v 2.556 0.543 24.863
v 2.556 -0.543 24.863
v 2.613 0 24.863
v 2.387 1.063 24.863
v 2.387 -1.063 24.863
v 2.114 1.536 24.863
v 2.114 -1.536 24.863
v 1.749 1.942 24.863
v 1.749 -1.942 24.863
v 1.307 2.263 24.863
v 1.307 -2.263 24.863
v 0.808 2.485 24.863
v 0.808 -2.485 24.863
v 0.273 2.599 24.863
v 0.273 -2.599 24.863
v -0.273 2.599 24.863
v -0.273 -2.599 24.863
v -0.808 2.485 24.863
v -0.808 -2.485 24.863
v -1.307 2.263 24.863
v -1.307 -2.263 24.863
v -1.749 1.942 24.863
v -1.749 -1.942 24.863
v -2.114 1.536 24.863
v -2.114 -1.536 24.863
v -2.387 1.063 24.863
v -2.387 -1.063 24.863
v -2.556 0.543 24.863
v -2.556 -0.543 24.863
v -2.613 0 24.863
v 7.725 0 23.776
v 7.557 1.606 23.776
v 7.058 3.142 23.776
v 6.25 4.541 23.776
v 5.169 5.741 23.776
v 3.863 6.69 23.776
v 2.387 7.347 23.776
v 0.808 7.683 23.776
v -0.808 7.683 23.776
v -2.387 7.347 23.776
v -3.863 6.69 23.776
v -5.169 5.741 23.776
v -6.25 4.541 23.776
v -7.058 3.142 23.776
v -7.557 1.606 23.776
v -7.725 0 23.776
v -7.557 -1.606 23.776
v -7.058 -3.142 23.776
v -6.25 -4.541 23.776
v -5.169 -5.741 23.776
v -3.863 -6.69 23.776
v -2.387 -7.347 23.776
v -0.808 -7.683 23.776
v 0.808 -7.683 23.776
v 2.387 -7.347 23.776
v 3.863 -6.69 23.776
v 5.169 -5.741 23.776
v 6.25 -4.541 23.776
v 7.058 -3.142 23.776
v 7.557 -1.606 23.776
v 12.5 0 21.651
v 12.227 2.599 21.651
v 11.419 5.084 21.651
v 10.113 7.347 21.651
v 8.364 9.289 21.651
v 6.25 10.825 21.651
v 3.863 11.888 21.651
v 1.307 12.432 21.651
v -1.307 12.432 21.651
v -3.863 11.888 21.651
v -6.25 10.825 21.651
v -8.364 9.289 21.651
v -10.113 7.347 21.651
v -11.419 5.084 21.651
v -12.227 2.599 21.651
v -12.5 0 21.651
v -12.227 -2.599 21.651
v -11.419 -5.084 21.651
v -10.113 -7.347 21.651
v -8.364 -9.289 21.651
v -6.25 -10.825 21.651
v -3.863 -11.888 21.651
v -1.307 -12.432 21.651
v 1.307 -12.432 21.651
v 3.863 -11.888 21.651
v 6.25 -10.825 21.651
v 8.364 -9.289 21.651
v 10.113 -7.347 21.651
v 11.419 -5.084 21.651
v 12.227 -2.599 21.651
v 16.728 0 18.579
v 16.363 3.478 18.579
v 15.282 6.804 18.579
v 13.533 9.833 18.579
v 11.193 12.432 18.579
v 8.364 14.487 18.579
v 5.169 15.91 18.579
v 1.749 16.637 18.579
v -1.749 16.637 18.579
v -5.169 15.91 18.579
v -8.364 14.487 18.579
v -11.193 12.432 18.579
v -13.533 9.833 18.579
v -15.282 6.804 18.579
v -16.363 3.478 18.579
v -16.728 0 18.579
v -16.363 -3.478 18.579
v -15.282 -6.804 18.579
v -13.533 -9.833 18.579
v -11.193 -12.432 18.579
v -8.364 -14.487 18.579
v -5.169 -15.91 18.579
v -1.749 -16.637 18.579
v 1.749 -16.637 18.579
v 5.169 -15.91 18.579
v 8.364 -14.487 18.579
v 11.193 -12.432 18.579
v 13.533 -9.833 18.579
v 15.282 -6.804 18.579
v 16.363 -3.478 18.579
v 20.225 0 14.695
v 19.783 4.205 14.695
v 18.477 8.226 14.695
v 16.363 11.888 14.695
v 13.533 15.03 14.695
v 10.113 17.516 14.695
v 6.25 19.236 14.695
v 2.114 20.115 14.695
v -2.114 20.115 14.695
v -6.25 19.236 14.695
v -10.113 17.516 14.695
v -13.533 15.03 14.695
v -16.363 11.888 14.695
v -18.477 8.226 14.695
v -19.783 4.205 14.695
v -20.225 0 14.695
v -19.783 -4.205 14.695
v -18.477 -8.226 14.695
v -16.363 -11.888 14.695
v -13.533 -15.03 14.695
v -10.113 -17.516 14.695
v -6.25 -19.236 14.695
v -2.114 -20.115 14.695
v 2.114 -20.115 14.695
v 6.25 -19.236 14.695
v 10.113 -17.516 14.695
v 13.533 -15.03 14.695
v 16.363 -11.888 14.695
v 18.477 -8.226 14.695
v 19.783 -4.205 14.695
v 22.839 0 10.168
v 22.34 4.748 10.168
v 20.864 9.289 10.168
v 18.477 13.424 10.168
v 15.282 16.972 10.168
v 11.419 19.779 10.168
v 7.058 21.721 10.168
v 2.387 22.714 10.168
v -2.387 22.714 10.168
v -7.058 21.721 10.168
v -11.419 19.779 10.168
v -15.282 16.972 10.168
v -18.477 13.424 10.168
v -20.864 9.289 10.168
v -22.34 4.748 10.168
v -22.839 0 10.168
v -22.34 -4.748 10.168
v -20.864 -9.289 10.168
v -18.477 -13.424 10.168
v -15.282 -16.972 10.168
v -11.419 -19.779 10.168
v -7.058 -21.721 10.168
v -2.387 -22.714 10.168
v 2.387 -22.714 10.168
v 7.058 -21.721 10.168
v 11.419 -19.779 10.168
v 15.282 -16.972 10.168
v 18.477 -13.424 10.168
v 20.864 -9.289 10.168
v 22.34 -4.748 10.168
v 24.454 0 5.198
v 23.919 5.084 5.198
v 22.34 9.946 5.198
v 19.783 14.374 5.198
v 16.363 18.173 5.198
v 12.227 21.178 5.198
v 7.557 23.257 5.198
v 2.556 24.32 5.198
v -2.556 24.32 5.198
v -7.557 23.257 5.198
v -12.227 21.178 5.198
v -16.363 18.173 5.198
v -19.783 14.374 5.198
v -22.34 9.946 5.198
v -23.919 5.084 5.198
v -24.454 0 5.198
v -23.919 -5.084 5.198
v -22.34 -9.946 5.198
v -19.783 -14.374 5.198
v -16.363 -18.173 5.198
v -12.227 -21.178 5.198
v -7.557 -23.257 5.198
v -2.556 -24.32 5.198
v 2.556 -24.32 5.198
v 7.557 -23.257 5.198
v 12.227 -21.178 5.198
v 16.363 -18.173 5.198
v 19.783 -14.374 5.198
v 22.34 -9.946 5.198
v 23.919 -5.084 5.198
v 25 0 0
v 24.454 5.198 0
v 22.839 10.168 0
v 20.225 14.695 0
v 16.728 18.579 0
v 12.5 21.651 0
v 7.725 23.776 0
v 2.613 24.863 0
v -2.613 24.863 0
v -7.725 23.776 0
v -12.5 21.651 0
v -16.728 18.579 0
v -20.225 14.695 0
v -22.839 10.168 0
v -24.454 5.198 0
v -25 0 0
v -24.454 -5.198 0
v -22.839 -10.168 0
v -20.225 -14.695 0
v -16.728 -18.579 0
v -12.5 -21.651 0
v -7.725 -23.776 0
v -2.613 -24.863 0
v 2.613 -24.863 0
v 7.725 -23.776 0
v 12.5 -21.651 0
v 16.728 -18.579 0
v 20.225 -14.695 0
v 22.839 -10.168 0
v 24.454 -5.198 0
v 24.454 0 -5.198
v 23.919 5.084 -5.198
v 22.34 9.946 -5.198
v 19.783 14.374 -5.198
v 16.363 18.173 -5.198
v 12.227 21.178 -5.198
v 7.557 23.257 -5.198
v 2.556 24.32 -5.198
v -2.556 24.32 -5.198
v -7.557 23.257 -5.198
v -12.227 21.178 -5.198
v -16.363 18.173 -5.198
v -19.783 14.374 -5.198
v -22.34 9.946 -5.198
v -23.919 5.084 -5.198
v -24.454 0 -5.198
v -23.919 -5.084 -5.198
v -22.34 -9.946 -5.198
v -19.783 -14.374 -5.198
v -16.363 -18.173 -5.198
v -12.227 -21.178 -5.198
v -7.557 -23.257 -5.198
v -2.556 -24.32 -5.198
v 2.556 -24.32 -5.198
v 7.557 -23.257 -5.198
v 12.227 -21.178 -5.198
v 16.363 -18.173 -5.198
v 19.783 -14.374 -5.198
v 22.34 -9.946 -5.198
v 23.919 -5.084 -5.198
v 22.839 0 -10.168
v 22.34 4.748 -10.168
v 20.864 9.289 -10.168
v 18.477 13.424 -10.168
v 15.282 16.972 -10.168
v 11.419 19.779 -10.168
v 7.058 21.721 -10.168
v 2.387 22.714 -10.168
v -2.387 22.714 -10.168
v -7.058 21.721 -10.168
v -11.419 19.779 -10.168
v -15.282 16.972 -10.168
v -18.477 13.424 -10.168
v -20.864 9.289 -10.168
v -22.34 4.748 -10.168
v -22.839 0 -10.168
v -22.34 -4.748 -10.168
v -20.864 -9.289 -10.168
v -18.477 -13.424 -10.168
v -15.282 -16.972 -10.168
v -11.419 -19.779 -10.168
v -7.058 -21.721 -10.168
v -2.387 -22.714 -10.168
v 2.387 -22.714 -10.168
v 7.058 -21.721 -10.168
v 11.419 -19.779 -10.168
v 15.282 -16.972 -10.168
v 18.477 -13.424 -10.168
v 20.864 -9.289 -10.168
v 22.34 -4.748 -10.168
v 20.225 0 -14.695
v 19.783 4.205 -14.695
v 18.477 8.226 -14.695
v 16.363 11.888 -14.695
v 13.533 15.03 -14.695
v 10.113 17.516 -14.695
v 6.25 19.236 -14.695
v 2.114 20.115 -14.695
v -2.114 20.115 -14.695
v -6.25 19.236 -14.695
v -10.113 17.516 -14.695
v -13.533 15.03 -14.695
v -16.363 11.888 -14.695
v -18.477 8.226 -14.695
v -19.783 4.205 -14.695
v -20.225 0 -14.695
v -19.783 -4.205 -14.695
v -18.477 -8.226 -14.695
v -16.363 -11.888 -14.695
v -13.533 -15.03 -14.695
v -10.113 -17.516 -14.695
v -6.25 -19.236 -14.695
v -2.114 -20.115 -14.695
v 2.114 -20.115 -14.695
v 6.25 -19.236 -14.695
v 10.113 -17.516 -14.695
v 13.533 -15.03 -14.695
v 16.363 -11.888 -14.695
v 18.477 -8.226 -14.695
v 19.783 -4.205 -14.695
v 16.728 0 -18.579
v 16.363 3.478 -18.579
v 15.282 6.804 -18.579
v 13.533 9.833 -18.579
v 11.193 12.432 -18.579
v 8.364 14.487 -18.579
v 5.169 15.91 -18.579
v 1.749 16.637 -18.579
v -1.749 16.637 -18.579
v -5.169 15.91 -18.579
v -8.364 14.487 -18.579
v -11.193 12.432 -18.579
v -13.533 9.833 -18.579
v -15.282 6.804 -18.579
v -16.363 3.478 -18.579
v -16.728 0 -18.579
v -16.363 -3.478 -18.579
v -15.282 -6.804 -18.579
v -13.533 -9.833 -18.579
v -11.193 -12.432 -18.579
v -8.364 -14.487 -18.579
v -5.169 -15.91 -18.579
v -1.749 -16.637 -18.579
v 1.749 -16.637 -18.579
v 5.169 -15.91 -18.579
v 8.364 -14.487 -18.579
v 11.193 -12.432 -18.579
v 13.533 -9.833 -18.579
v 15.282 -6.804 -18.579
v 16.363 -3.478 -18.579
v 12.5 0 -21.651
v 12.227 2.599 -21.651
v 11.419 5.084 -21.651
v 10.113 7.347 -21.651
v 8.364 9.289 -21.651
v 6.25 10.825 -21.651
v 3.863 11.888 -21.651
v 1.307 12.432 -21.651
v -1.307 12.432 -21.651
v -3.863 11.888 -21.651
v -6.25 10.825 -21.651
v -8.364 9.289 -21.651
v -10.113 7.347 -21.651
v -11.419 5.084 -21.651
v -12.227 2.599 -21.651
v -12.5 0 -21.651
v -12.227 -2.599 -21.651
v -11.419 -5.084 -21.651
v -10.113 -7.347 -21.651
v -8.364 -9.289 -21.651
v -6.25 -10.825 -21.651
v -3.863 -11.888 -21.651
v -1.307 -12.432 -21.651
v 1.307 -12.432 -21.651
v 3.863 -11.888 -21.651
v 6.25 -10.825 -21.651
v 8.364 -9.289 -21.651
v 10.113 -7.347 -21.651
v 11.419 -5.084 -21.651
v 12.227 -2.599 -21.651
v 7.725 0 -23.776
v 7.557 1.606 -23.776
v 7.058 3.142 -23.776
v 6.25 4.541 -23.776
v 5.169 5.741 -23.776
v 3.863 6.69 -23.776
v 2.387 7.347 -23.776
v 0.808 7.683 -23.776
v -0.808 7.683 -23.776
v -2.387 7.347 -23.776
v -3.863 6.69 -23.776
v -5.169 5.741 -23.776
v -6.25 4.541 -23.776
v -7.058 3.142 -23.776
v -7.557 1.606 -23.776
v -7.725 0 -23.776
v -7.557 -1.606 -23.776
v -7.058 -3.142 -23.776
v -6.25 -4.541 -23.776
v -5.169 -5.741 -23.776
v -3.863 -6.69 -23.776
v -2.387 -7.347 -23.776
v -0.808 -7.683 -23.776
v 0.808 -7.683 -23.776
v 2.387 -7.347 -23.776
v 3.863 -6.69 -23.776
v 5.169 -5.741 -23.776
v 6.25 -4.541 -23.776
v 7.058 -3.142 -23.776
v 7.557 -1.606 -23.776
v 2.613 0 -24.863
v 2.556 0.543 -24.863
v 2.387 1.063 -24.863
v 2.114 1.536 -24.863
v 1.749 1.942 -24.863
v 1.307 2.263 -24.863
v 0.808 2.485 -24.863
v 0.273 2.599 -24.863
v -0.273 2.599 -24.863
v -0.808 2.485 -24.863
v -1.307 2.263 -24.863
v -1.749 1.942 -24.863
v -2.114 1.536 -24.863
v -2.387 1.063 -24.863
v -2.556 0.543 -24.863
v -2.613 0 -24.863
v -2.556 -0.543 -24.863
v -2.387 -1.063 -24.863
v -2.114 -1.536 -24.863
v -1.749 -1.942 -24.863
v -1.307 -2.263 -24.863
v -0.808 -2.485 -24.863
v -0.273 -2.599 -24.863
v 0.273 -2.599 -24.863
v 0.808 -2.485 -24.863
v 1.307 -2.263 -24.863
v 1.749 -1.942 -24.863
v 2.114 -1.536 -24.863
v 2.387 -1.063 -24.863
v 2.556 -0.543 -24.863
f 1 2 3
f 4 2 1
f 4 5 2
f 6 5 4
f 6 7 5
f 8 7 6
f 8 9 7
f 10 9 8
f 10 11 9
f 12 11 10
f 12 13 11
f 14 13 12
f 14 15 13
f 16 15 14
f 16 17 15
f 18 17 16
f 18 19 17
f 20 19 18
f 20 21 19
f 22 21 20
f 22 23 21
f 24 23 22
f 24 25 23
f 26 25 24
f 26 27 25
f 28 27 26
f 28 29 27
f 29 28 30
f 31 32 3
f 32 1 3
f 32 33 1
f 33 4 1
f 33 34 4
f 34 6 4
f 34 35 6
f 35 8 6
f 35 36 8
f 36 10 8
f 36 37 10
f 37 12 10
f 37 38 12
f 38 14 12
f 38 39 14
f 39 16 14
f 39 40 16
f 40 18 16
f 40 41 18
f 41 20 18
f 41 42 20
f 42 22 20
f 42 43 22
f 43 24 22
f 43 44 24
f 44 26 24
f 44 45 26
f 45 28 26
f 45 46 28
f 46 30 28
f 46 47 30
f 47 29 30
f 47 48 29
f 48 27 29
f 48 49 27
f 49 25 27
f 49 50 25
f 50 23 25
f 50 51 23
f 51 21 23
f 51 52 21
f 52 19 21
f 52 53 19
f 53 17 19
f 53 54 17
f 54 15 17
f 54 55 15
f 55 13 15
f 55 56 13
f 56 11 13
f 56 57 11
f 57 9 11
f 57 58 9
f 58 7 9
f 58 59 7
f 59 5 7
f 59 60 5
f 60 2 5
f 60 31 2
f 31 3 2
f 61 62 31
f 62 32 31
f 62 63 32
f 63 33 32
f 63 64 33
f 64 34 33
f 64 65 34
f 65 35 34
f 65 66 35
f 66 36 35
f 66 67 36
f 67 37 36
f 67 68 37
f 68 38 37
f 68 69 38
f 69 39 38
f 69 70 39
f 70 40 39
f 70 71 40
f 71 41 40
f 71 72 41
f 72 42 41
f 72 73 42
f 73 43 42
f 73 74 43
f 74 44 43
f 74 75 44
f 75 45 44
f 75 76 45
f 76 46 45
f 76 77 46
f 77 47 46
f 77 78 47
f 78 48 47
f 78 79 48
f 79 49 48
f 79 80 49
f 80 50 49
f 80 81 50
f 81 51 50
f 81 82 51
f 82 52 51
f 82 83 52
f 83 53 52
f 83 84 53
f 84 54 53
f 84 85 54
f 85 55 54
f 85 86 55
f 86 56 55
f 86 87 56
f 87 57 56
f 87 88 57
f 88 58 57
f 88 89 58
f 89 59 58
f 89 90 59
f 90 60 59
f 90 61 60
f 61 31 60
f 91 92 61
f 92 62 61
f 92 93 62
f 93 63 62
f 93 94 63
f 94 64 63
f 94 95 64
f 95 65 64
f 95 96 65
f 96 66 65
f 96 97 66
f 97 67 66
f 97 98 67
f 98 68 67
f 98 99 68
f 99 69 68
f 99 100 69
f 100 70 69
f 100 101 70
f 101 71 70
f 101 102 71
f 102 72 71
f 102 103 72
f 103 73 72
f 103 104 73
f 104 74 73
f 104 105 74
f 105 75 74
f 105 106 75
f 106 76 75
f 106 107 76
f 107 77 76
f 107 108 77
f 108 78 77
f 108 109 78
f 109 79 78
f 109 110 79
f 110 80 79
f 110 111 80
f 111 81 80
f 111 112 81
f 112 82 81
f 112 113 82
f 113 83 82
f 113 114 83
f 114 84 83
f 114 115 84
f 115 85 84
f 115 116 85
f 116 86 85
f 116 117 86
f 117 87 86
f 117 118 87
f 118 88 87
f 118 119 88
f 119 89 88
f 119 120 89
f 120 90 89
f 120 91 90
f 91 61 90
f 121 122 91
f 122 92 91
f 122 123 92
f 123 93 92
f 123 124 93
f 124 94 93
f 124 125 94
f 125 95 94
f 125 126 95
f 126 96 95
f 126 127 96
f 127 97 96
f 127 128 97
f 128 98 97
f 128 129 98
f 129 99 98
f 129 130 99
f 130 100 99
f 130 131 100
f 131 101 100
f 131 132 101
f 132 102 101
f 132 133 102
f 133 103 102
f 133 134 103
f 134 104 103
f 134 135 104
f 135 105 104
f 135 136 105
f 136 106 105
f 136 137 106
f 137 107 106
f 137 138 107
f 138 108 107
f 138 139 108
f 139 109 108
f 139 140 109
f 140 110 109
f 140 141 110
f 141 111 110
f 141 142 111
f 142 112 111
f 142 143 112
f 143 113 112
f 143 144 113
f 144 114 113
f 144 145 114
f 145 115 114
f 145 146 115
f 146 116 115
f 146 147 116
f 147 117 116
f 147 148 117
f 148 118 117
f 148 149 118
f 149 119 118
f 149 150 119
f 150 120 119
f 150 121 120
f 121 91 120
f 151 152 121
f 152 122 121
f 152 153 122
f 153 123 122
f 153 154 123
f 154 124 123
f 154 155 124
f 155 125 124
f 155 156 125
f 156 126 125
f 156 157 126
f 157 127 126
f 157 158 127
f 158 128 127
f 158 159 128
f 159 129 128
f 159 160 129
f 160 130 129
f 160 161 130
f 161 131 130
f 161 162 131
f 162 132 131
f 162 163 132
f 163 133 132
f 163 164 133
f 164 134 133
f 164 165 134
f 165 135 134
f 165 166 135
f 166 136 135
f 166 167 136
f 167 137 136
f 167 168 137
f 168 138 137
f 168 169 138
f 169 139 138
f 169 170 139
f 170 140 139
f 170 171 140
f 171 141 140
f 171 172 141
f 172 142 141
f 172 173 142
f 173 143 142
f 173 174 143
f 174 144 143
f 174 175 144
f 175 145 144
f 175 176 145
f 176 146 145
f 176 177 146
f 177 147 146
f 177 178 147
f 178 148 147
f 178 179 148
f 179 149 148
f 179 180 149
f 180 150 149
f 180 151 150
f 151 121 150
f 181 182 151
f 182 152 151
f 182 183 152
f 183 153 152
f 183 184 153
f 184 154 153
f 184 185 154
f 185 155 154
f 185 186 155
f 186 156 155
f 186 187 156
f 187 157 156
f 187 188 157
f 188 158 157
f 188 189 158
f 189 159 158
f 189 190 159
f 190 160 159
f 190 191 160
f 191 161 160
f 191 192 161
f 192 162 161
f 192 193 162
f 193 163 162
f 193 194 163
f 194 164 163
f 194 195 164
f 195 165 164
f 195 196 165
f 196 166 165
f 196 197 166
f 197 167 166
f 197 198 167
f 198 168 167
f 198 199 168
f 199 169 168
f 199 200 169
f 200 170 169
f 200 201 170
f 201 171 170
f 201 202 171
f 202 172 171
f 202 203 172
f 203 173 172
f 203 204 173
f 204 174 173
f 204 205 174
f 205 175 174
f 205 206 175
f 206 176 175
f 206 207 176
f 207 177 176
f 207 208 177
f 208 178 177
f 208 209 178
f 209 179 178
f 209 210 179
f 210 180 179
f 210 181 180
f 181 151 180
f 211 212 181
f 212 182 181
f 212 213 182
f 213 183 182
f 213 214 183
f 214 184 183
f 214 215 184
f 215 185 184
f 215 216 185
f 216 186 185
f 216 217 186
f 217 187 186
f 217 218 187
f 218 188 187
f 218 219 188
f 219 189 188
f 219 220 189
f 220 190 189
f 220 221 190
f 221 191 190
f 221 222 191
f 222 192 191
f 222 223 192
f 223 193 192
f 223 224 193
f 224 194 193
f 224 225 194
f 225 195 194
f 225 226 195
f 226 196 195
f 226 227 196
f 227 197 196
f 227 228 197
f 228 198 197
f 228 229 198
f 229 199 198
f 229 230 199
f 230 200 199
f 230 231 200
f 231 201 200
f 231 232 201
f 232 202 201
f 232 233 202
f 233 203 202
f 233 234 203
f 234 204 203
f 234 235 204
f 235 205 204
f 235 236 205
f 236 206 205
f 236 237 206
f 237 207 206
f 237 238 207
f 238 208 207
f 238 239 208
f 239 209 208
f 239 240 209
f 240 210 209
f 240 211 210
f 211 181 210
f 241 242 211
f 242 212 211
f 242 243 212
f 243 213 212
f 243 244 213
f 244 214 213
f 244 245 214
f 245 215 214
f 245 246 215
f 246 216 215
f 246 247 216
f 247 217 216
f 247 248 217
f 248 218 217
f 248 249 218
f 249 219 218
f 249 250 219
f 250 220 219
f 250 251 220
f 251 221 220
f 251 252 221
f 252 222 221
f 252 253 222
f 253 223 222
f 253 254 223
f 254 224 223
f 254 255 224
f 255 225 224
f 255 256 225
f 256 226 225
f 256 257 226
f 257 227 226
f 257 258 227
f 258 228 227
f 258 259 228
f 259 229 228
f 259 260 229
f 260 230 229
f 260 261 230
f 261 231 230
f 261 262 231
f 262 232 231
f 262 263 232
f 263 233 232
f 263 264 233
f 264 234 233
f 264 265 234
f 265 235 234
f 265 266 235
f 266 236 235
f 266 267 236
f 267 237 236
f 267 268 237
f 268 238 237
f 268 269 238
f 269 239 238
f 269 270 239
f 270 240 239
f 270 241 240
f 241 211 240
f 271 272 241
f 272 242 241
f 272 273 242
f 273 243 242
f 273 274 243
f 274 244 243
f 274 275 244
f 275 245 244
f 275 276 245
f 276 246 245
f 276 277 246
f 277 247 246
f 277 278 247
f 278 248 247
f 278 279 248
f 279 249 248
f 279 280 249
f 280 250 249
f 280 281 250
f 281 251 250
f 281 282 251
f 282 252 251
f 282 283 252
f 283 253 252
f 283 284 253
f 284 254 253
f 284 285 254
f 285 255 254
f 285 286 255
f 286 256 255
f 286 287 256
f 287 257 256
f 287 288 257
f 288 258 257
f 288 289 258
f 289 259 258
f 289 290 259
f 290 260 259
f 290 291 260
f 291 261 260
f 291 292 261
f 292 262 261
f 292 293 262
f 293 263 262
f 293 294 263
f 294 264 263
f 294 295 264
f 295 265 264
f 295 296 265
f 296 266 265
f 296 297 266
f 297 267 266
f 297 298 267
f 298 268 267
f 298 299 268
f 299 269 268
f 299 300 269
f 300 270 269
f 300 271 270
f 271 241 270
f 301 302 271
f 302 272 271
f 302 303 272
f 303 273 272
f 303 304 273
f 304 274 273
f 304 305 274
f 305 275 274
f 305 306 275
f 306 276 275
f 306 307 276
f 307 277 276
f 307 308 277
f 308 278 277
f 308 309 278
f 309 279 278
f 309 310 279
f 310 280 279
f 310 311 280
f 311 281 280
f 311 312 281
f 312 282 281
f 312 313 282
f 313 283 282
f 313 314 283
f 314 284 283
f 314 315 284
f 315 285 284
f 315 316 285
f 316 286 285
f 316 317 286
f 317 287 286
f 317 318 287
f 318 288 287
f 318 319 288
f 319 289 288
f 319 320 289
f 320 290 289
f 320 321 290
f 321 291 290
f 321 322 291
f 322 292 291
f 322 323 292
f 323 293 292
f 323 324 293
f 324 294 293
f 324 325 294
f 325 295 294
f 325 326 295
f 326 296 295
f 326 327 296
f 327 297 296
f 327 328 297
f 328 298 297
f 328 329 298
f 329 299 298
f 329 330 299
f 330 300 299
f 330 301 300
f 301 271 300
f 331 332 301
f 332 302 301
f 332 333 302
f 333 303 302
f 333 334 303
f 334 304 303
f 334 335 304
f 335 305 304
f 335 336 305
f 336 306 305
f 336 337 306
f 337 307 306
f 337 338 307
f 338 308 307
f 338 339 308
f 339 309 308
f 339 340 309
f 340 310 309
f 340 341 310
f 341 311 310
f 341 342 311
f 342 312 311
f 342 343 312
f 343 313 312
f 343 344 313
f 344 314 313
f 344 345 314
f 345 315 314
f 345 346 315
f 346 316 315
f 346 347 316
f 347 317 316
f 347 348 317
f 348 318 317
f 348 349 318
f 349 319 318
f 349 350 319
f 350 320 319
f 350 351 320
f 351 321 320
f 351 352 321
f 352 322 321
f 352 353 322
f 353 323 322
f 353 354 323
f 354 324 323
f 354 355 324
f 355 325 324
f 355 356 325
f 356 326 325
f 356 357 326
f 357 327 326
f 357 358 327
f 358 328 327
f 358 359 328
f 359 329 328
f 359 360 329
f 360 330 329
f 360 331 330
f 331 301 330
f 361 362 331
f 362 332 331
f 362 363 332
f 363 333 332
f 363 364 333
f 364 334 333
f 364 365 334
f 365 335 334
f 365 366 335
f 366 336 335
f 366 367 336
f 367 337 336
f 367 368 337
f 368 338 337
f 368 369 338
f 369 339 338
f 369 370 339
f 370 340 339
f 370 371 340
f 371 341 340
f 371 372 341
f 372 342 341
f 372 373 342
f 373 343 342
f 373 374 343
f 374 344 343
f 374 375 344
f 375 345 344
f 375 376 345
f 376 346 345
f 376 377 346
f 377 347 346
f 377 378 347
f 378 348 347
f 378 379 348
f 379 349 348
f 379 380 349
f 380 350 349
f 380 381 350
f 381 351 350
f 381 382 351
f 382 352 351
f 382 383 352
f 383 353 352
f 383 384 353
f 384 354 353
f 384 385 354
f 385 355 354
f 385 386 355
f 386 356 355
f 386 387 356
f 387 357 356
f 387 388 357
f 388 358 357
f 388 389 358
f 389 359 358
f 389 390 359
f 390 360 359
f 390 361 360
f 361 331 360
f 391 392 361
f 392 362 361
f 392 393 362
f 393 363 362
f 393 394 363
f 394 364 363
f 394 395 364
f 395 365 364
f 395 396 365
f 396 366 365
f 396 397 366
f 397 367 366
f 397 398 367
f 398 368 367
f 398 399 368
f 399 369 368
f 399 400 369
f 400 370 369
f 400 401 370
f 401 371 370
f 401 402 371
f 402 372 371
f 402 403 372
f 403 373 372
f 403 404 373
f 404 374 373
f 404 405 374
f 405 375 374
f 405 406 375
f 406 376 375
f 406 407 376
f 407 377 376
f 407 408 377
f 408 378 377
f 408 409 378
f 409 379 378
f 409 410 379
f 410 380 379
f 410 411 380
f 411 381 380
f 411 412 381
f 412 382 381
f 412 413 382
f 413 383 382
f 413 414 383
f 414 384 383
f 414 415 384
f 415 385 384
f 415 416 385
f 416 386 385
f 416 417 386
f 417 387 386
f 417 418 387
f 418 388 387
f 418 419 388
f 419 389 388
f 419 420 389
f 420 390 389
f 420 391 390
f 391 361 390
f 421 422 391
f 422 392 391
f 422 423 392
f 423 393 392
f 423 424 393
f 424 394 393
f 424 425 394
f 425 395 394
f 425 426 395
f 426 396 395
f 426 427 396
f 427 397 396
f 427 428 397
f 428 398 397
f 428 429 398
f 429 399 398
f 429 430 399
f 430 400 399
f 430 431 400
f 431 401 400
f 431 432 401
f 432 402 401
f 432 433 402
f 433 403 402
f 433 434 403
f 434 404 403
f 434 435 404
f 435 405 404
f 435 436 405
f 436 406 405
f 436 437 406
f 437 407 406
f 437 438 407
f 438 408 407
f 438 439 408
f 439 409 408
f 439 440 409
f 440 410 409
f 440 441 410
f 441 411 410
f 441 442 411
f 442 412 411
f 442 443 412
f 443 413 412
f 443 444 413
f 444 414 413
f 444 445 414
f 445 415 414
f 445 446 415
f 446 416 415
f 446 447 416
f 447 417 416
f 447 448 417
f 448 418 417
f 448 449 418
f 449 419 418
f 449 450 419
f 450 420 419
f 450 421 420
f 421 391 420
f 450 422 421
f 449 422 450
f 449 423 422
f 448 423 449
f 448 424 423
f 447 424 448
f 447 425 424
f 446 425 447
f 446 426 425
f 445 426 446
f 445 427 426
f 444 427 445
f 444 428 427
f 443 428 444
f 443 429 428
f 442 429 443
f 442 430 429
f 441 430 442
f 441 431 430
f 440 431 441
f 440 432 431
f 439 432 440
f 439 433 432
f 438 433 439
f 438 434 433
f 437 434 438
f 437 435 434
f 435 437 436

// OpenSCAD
union() {
    *sphere(r=9);
    *sphere(r=16);
    sphere(r=25);
};
